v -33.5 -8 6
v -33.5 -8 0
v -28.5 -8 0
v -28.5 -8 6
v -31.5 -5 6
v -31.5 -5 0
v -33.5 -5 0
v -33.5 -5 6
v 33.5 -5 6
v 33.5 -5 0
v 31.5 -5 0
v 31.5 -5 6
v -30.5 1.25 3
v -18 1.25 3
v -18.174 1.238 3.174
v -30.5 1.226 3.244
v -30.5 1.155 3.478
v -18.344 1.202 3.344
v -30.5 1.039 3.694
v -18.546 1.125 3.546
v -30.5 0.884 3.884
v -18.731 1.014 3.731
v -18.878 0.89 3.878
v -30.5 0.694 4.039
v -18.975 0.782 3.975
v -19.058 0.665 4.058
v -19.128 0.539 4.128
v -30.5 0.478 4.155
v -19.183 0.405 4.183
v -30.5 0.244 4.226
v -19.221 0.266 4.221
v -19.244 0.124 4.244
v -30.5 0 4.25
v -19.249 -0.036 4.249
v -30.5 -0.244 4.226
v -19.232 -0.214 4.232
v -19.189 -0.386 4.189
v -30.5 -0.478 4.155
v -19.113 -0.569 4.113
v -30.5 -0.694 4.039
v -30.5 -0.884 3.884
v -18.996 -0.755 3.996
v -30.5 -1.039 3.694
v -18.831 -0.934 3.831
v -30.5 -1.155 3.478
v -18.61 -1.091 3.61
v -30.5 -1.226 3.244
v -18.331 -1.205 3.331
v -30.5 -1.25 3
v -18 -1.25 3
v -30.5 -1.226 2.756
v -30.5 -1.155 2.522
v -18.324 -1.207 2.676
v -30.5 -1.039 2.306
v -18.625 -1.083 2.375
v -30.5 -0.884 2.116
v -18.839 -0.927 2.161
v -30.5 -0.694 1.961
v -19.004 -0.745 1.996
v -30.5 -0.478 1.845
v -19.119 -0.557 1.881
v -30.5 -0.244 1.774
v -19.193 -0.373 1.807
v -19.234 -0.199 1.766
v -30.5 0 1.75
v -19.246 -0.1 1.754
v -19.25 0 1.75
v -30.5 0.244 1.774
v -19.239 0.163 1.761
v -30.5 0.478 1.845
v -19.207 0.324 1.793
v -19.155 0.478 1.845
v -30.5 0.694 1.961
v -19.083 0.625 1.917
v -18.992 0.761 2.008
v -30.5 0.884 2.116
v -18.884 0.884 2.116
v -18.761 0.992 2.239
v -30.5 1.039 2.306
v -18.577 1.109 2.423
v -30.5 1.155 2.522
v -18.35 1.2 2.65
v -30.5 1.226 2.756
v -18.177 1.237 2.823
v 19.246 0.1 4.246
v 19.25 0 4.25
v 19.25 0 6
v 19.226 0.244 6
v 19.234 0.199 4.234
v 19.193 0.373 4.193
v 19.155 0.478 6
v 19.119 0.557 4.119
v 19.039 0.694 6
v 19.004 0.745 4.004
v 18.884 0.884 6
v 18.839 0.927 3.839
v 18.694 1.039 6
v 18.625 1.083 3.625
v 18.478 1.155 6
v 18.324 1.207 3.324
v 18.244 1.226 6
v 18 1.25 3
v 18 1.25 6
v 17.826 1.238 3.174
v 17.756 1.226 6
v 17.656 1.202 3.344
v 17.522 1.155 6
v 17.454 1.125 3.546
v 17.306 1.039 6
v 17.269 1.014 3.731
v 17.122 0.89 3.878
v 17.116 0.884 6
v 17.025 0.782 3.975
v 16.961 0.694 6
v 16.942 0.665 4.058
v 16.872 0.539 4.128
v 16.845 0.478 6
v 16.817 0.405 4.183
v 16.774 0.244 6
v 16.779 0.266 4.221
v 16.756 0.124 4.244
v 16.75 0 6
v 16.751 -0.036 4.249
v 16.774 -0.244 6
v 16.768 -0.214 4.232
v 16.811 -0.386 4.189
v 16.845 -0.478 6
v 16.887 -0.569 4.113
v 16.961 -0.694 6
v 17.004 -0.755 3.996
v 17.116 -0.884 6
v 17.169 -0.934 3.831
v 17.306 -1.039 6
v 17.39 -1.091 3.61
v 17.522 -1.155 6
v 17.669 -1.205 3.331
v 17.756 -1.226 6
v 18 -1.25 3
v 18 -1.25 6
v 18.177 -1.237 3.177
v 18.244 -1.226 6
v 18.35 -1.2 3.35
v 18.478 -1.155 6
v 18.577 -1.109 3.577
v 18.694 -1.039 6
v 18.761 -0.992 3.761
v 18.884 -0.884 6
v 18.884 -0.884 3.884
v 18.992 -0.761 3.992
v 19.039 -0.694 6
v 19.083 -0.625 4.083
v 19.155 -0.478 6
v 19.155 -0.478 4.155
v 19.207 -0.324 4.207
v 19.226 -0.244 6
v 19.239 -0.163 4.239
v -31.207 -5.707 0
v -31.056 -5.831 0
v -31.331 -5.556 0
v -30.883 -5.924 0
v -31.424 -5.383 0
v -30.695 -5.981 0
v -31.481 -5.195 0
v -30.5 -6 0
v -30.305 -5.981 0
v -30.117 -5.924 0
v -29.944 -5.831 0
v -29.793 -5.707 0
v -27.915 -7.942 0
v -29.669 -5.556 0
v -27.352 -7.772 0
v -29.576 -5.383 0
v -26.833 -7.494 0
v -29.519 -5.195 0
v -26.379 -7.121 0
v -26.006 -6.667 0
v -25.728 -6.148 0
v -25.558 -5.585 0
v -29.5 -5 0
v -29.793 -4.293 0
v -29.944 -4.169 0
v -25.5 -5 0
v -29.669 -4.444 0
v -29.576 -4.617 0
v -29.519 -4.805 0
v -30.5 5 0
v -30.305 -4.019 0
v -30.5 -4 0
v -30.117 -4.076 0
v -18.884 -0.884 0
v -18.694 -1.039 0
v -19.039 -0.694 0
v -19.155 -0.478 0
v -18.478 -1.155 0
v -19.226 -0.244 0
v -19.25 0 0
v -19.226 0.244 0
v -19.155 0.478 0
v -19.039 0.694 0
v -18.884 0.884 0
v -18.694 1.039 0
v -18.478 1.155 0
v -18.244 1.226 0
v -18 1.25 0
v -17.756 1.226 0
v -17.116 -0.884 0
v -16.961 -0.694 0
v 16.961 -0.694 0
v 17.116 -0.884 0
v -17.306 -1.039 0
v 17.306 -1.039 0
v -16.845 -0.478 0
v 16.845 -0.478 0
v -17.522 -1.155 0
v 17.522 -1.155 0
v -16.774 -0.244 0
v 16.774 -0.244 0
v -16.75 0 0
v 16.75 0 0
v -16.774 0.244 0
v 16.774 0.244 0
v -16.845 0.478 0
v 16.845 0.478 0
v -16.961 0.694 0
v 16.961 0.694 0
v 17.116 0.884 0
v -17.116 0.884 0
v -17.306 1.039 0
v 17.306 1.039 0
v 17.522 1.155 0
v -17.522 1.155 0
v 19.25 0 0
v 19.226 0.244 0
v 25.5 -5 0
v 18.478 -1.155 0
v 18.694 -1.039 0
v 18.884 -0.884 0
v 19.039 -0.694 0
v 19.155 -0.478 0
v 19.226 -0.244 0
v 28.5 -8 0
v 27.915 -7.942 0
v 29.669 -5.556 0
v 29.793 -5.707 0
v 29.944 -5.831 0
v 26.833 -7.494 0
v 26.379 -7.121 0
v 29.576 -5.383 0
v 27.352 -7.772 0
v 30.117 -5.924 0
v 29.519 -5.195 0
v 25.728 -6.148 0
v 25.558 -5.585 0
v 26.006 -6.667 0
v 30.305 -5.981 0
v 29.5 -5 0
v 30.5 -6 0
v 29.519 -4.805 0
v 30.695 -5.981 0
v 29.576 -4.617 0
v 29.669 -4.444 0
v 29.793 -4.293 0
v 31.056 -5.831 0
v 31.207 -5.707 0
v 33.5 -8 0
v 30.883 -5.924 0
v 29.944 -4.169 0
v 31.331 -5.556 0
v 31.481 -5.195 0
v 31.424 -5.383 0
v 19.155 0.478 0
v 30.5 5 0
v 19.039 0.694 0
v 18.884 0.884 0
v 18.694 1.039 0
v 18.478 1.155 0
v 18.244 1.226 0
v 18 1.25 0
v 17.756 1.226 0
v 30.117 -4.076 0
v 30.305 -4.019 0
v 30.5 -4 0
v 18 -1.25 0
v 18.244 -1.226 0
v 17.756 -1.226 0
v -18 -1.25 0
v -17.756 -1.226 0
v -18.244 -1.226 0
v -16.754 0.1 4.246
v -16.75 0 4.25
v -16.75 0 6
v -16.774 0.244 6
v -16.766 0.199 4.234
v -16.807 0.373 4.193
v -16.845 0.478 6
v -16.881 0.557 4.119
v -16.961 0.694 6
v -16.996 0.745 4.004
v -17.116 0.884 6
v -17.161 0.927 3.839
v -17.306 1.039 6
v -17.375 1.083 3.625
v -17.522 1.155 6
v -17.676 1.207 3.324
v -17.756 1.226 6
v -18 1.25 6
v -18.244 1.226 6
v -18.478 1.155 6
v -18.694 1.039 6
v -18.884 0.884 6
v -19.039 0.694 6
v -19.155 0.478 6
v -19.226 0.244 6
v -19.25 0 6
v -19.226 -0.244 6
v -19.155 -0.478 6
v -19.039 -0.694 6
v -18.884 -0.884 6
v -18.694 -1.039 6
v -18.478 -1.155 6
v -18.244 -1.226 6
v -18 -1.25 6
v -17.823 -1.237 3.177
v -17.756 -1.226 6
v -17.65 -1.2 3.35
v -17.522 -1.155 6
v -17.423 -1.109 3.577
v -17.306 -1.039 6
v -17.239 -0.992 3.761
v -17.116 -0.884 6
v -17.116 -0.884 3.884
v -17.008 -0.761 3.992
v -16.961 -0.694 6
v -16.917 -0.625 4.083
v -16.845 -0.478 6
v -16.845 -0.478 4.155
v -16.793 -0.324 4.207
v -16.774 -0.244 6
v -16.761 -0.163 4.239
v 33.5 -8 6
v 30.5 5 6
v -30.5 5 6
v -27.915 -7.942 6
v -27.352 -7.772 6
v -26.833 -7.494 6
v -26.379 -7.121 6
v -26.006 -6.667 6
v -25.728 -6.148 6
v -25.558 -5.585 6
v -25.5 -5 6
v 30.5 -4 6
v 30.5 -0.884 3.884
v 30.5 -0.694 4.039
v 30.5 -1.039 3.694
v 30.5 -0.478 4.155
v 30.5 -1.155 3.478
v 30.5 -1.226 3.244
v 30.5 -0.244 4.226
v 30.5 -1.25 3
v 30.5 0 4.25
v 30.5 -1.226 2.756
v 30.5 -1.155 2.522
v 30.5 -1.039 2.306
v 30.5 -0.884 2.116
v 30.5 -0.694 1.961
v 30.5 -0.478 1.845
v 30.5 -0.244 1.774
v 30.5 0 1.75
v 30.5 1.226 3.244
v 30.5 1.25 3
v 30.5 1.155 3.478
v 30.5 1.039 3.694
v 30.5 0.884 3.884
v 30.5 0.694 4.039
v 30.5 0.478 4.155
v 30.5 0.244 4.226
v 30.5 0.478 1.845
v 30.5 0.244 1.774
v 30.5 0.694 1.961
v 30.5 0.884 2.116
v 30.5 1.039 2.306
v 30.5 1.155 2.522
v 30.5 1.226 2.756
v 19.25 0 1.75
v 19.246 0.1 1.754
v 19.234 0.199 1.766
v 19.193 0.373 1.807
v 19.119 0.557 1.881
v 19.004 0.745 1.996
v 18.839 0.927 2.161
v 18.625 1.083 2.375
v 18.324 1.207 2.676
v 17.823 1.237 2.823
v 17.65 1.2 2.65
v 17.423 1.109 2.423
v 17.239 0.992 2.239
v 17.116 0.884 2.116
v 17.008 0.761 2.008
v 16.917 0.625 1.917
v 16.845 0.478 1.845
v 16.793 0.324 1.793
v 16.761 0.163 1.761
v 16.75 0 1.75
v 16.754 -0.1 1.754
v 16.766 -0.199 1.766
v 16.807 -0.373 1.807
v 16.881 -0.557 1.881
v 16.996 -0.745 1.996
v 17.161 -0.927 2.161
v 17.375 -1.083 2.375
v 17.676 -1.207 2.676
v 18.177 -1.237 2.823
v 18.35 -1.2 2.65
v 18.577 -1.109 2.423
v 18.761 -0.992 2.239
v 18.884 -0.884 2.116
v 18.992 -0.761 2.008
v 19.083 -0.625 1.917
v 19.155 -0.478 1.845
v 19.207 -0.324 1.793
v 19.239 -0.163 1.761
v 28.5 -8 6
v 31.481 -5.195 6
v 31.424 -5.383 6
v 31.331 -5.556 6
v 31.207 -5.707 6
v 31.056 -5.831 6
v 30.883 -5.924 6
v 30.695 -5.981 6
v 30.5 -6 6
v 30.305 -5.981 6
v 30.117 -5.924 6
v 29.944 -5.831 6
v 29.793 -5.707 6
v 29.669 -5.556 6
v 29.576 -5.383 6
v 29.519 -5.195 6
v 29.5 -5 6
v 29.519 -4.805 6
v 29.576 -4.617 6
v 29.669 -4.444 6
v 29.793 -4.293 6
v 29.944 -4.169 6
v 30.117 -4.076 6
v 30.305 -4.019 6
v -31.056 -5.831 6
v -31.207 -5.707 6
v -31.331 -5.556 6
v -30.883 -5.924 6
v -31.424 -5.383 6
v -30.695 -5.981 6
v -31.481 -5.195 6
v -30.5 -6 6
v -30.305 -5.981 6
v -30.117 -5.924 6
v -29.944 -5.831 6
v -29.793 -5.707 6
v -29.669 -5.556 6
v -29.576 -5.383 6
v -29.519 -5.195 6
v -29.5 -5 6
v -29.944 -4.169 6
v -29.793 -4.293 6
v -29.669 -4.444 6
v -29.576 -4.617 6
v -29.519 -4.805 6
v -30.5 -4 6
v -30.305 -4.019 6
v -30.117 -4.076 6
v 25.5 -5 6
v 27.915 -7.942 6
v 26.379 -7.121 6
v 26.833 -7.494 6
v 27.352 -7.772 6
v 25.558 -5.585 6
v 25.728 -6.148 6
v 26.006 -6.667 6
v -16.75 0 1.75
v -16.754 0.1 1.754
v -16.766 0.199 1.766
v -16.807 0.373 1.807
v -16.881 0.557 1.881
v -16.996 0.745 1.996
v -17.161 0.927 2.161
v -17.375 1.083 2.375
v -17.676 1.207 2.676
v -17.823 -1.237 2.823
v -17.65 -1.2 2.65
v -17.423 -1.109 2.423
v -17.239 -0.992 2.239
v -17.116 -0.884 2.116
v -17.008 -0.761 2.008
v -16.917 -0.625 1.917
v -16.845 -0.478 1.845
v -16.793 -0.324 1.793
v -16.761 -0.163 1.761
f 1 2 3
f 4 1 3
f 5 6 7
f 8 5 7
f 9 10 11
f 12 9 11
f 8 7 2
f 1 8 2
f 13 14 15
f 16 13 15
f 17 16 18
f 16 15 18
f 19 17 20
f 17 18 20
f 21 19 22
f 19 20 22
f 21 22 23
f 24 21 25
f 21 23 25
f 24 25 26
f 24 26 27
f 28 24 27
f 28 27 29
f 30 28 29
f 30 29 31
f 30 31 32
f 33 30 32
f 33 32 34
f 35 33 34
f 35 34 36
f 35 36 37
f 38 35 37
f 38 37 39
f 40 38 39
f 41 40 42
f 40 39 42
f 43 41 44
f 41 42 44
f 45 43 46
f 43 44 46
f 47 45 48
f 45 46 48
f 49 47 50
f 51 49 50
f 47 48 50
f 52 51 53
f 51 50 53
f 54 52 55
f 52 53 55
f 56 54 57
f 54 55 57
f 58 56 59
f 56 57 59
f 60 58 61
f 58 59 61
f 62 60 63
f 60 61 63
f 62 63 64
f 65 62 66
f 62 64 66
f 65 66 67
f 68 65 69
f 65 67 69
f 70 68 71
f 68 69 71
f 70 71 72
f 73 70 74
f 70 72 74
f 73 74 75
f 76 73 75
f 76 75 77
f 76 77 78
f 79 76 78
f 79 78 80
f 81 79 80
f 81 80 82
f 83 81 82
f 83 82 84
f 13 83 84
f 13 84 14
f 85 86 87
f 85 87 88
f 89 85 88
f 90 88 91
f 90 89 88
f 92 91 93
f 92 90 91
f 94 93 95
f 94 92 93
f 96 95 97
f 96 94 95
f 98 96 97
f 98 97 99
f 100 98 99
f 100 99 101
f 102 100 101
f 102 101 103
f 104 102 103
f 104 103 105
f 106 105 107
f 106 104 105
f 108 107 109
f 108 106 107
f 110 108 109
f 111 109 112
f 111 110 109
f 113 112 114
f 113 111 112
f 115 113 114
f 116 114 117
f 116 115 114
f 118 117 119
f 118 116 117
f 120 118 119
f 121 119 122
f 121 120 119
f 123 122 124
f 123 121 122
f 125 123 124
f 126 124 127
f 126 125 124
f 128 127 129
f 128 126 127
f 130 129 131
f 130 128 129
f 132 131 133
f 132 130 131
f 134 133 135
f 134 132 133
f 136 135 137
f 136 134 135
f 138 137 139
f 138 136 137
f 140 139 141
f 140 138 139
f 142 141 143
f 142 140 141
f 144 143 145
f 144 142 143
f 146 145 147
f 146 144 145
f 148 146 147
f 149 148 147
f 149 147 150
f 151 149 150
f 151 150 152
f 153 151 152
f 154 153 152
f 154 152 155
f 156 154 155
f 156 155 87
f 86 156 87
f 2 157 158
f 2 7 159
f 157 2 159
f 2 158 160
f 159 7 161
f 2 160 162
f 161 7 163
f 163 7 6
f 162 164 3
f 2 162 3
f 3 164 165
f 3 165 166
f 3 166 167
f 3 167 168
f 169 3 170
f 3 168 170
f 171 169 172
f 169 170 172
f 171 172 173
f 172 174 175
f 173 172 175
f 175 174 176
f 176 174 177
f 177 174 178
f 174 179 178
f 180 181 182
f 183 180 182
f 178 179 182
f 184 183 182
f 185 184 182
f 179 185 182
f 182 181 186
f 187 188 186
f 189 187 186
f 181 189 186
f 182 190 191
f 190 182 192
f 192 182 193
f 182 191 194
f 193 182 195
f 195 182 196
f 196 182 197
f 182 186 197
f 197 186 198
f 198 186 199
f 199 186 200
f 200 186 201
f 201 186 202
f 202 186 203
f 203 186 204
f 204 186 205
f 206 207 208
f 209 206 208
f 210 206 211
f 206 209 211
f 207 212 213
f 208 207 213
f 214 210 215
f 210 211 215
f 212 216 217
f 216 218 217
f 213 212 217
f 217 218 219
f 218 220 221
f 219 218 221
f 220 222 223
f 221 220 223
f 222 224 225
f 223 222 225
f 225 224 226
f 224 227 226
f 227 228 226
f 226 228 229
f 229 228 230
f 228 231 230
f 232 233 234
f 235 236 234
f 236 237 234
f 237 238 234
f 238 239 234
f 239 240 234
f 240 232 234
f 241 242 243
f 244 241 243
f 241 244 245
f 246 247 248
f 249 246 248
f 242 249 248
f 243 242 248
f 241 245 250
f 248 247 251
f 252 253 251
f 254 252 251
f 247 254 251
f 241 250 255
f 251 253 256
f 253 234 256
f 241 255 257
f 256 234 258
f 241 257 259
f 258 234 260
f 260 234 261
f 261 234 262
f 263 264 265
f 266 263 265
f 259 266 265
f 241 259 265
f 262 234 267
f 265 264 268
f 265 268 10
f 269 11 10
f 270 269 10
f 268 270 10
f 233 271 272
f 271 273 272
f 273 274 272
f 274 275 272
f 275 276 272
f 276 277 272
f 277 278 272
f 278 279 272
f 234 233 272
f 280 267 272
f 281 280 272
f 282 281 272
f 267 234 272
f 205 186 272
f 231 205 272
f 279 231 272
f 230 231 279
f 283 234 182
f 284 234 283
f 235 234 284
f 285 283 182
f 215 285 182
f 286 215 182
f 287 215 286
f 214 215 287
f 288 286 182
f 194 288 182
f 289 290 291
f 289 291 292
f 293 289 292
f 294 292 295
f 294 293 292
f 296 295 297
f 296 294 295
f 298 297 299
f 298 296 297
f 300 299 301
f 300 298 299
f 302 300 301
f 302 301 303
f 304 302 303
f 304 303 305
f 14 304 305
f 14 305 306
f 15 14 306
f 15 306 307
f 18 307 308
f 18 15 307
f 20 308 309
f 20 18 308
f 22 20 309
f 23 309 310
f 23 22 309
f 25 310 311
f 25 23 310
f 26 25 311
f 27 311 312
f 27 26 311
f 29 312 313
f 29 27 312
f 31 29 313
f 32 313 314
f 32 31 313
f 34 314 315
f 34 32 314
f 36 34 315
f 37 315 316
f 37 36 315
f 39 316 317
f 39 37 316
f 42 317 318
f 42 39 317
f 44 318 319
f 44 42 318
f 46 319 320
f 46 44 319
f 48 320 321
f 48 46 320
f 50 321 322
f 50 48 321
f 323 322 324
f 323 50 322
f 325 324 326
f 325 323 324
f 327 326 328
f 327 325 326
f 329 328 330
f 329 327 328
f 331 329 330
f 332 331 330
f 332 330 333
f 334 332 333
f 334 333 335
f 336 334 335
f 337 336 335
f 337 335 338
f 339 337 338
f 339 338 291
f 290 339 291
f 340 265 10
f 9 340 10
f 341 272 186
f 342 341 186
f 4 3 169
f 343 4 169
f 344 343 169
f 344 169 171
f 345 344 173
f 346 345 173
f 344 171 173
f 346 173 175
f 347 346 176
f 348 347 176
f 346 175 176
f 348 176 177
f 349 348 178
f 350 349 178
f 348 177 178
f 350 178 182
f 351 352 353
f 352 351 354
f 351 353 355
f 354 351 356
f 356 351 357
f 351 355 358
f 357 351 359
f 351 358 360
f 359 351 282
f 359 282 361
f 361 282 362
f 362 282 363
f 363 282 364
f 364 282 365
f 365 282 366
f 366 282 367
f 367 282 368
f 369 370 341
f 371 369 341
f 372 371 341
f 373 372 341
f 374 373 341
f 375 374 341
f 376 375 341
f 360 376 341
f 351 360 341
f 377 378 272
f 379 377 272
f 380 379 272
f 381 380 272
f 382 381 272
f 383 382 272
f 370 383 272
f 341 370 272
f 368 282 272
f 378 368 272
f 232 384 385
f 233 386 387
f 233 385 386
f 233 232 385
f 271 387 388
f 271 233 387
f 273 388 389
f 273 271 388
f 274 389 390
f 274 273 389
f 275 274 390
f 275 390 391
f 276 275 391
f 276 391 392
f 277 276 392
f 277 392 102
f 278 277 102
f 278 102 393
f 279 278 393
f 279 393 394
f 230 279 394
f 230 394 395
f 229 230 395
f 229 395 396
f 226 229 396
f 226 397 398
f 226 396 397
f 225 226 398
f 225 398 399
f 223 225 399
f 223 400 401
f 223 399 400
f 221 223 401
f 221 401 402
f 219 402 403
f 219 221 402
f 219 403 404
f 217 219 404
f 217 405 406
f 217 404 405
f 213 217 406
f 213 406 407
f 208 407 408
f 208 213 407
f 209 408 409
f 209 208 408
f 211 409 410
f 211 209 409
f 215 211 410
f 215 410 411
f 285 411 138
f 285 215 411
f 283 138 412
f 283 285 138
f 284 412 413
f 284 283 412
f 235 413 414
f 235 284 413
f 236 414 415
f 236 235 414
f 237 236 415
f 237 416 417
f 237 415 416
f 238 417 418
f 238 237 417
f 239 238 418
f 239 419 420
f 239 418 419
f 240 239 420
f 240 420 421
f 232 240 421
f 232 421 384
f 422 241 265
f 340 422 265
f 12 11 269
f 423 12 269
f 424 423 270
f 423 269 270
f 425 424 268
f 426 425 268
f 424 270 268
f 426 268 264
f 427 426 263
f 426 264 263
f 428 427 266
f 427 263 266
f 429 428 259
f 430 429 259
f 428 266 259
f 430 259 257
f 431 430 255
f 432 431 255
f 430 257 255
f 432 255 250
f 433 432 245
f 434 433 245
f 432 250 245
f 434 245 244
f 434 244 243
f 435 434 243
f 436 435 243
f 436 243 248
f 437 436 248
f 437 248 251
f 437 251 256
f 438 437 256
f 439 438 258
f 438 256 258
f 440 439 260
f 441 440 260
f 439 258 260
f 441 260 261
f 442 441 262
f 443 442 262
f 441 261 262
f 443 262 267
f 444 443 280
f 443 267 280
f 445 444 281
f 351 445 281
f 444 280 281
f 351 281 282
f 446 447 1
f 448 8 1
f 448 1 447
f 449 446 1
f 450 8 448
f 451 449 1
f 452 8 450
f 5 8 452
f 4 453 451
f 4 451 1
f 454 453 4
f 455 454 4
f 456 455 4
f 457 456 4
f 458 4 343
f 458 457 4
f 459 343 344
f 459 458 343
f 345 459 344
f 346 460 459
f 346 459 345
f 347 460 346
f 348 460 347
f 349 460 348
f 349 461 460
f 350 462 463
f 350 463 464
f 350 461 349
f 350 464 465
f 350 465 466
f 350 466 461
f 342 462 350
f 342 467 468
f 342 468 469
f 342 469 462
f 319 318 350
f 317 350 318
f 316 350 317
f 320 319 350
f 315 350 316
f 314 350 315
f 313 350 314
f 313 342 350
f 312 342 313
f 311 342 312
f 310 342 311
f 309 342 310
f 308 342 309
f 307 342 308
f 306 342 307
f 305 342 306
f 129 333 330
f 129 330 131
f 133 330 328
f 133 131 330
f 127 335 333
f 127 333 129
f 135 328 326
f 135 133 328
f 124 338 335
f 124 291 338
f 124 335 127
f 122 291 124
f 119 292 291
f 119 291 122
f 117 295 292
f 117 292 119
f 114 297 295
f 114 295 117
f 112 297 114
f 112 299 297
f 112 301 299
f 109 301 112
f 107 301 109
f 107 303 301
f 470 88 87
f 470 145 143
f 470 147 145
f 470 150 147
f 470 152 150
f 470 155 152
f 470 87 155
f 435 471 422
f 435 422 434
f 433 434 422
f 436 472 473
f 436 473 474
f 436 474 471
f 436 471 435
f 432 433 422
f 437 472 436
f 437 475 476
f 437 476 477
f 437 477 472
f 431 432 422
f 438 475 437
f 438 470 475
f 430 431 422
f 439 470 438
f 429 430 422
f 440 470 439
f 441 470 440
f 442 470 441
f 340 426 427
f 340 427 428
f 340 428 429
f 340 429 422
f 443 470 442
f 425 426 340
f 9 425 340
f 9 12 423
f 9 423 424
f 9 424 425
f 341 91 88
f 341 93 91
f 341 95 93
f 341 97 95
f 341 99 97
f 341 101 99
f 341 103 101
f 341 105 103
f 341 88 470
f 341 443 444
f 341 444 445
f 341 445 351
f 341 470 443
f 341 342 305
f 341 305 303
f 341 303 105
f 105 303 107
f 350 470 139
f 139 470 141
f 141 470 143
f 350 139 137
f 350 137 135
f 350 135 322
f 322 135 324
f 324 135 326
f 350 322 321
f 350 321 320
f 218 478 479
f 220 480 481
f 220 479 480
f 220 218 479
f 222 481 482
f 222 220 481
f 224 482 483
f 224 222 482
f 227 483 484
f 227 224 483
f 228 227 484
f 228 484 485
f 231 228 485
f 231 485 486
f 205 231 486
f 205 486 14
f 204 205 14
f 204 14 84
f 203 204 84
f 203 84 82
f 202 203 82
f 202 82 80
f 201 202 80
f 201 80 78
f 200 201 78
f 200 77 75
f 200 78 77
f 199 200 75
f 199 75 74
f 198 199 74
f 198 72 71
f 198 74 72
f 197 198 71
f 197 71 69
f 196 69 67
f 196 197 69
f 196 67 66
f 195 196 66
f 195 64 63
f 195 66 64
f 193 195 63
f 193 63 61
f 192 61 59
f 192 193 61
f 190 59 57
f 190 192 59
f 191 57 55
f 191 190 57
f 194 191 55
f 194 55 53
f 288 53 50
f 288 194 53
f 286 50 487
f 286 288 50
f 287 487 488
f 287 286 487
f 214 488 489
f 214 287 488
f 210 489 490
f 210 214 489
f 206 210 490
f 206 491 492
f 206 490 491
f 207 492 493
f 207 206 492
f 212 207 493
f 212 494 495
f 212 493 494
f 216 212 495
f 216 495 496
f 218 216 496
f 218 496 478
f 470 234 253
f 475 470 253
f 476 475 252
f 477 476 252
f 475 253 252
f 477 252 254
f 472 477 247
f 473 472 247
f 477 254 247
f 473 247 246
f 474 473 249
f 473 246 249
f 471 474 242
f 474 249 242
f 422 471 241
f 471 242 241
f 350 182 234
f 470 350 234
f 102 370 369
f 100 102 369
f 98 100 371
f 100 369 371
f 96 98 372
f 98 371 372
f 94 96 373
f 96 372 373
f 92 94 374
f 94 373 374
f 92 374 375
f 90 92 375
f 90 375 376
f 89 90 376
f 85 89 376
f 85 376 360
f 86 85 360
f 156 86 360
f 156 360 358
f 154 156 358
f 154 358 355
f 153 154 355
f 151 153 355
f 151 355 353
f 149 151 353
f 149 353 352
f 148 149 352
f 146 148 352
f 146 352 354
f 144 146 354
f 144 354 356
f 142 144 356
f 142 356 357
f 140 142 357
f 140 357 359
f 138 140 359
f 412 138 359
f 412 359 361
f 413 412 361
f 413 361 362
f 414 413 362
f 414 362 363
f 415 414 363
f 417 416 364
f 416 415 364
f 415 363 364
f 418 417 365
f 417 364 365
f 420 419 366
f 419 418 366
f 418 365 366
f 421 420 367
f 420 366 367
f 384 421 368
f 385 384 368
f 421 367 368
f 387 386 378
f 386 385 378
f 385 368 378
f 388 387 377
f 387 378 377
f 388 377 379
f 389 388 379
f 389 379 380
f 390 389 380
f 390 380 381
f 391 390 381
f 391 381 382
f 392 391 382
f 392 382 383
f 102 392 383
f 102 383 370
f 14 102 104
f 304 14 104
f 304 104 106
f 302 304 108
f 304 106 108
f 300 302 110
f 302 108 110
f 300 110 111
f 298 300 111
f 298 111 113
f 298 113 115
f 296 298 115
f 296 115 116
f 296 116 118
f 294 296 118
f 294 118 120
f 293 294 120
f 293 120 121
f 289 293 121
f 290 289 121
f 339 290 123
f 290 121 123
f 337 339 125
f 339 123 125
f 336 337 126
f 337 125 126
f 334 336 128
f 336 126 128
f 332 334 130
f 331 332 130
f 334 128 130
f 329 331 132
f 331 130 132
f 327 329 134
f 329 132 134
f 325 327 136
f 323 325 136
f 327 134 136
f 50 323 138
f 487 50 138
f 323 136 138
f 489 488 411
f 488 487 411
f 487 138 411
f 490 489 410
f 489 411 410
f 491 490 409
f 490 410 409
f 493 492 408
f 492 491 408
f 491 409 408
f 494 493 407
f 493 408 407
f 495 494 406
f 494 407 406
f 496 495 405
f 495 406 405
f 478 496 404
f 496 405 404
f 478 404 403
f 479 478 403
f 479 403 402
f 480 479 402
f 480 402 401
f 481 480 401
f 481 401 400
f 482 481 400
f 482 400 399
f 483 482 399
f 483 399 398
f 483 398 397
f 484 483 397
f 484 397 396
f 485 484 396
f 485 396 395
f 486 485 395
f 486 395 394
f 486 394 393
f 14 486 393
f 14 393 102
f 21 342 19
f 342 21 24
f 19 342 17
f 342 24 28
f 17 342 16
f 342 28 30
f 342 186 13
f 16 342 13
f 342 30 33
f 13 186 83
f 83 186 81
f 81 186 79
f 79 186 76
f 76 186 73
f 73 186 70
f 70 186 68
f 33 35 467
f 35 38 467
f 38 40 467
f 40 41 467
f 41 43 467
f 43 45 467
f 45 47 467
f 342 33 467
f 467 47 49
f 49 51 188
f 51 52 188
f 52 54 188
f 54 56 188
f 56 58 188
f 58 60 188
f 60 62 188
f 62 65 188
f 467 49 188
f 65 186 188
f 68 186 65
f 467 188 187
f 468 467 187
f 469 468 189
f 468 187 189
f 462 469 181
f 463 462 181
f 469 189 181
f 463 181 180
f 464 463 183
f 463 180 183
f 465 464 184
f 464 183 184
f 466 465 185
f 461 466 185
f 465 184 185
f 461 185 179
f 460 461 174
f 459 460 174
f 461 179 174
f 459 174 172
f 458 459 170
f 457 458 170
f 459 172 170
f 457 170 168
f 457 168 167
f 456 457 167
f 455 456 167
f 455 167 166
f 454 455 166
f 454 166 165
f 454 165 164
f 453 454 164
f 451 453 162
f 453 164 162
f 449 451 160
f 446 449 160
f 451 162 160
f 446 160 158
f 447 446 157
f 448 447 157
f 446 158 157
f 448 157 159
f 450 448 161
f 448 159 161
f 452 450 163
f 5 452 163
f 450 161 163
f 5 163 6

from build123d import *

# Parameters (mm, degrees)
F0_R     = 1.25
F1_DEPTH = 6
F2_R     = 1.25
F3_DEPTH = 64.001


with BuildPart() as f1:
    # F0 (on Top) → F1 (new body)
    with BuildSketch(Plane.XY):
        with BuildLine():
            Line((30.5, -4), (30.5, 5))
            Line((30.5, 5), (-30.5, 5))
            Line((-30.5, 5), (-30.5, -4))
            ThreePointArc((-30.5, -4), (-29.792893, -5.707107), (-31.5, -5))
            Line((-31.5, -5), (-33.5, -5))
            Line((-33.5, -5), (-33.5, -8))
            Line((-33.5, -8), (-28.5, -8))
            ThreePointArc((-28.5, -8), (-26.37868, -7.12132), (-25.5, -5))
            Line((-25.5, -5), (25.5, -5))
            ThreePointArc((25.5, -5), (26.37868, -7.12132), (28.5, -8))
            Line((28.5, -8), (33.5, -8))
            Line((33.5, -8), (33.5, -5))
            Line((33.5, -5), (31.5, -5))
            ThreePointArc((31.5, -5), (29.792893, -5.707107), (30.5, -4))
        make_face()
        with Locations((-18, 0)):
            Circle(F0_R, mode=Mode.SUBTRACT)
        with Locations((18, 0)):
            Circle(F0_R, mode=Mode.SUBTRACT)
    extrude(amount=F1_DEPTH)

    # F2 (on face) → F3 (cut, through all)
    with BuildSketch(Plane.YZ.offset(30.5)):
        with Locations((0, 3)):
            Circle(F2_R)
    extrude(amount=-F3_DEPTH, mode=Mode.SUBTRACT)


solid = f1.part
